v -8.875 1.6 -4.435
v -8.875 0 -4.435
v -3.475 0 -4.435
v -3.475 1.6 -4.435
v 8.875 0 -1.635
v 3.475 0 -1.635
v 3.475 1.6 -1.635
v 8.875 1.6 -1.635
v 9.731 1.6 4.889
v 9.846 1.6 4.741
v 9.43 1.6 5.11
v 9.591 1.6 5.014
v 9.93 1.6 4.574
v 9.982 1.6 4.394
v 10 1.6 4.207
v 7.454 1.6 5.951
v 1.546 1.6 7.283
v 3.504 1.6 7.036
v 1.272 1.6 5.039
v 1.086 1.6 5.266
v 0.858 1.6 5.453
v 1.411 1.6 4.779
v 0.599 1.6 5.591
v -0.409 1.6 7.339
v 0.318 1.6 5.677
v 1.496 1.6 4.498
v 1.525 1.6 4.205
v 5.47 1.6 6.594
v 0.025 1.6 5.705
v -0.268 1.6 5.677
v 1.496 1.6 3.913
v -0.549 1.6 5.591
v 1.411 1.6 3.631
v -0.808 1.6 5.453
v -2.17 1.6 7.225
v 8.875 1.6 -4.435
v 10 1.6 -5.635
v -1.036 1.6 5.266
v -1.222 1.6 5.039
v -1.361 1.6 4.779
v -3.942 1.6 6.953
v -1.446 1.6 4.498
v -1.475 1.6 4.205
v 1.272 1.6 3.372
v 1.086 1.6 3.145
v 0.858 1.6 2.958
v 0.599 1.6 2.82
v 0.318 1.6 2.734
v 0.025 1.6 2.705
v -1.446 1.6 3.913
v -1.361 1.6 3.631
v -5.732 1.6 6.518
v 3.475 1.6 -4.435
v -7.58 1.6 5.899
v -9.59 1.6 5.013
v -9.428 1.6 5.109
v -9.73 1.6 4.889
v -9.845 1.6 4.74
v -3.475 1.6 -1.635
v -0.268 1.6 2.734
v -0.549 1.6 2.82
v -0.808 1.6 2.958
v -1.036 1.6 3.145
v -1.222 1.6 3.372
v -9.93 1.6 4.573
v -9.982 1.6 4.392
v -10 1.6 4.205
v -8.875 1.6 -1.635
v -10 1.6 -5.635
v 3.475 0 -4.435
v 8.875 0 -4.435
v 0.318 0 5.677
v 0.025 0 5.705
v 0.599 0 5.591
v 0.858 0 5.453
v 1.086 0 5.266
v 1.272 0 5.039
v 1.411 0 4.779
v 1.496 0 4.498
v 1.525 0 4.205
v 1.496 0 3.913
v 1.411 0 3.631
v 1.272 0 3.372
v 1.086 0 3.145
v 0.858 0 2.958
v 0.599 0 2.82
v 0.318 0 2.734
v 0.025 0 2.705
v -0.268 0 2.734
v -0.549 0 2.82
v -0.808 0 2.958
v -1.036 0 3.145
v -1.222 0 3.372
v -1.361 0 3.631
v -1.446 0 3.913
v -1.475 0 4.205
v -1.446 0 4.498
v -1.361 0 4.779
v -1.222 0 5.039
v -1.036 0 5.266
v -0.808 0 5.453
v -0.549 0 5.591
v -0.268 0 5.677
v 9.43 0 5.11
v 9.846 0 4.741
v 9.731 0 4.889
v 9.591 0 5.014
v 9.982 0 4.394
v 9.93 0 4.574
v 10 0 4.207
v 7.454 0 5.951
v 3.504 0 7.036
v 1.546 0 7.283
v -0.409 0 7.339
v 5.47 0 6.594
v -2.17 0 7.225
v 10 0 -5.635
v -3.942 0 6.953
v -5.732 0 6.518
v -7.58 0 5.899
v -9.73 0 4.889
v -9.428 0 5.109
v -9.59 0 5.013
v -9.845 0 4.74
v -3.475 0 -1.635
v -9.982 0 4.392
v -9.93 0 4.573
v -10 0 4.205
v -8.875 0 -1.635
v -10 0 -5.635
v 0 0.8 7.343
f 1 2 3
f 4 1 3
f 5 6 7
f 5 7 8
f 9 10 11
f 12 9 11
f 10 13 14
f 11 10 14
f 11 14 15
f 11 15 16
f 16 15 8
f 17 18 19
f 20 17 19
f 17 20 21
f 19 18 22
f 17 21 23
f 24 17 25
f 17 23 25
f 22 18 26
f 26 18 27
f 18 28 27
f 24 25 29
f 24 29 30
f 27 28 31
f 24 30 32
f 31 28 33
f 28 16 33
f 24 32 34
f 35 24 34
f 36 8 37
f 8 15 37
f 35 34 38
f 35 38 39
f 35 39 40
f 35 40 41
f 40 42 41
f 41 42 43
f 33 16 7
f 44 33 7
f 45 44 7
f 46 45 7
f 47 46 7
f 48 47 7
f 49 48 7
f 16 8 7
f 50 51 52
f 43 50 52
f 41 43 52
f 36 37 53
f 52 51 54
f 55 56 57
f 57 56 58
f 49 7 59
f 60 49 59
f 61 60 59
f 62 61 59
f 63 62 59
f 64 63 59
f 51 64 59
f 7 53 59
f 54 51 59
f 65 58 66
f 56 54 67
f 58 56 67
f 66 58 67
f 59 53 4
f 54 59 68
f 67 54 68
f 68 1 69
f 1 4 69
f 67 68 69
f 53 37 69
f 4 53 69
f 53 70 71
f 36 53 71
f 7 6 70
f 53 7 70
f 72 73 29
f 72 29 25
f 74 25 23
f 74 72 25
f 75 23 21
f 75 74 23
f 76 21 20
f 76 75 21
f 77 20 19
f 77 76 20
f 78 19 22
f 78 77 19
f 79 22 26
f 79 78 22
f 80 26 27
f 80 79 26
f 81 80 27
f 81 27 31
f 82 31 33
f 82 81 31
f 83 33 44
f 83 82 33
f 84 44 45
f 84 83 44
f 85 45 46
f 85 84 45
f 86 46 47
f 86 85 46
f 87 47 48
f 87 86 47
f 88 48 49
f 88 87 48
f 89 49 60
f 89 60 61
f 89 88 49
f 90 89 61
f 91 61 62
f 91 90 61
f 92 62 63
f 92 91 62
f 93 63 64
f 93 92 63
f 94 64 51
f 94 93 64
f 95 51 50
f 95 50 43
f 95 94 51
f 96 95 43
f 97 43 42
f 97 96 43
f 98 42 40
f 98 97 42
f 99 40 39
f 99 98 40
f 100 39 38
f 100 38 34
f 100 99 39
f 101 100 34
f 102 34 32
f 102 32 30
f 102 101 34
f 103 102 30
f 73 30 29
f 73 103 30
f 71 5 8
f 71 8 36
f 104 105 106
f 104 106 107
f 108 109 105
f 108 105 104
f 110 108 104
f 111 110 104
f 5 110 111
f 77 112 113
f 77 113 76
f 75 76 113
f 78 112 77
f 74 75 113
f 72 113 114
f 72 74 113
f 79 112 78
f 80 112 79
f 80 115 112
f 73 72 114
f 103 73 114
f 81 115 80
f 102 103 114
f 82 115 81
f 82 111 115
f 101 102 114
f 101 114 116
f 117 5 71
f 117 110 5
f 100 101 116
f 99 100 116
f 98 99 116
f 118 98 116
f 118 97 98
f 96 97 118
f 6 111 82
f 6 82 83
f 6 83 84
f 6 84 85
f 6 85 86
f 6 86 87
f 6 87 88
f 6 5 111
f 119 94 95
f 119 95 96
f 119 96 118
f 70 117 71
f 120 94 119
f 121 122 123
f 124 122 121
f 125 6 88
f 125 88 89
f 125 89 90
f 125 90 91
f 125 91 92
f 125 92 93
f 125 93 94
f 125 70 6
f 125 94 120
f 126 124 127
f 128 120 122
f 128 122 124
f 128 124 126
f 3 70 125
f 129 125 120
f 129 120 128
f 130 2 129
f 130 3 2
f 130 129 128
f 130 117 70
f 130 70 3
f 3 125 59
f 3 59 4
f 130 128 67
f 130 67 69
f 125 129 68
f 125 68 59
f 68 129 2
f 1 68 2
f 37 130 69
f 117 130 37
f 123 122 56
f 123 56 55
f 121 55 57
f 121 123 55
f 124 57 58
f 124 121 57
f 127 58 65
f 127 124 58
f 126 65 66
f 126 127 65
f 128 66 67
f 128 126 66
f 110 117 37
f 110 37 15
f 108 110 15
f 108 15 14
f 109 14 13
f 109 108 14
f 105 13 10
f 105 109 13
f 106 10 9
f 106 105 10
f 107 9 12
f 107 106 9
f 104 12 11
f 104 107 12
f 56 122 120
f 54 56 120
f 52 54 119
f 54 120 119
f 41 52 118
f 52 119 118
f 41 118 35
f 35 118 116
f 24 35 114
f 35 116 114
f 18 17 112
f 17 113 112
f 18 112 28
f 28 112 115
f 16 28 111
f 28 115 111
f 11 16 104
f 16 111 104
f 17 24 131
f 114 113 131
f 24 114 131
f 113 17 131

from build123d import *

# Parameters (mm, degrees)
SKETCH_1_R      = 1.5
SKETCH_1_W      = 5.4
SKETCH_1_H      = 2.8
EXTRUDE_1_DEPTH = 1.6


with BuildPart() as part:
    # 스케치1 → 보스-돌출1 (new body)
    with BuildSketch(Plane(origin=(0, 0, 0), x_dir=(1, 0, 0), z_dir=(0, 1, 0))):
        with BuildLine():
            Line((-10, 5.634530717), (10, 5.634530717))
            Line((10, 5.634530717), (10, -4.207222136))
            ThreePointArc((10, -4.207222136), (9.845653495, -4.740954435), (9.430259666, -5.109927304))
            add(Edge.make_bspline(
                [(-9.428195587, -5.109155368), (-6.286031575, -6.598013928), (-0.00904299, -8.087277746), (6.306496469, -6.598817984), (9.430259666, -5.109927304)],
                knots=[0.028590221, 0.028590221, 0.028590221, 0.028590221, 0.499914822, 0.971328473, 0.971328473, 0.971328473, 0.971328473], degree=3))
            ThreePointArc((-9.428195587, -5.109155368), (-9.845043072, -4.740167522), (-10, -4.205469283))
            Line((-10, -4.205469283), (-10, 5.634530717))
        make_face()
        with Locations(Location((0.025, -4.205469283, 0), (0, 0, 270))):
            Circle(SKETCH_1_R, mode=Mode.SUBTRACT)
        with Locations((6.175, 3.034530717)):
            Rectangle(SKETCH_1_W, SKETCH_1_H, mode=Mode.SUBTRACT)
        with Locations((-6.175, 3.034530717)):
            Rectangle(SKETCH_1_W, SKETCH_1_H, mode=Mode.SUBTRACT)
    extrude(amount=EXTRUDE_1_DEPTH)


solid = part.part
